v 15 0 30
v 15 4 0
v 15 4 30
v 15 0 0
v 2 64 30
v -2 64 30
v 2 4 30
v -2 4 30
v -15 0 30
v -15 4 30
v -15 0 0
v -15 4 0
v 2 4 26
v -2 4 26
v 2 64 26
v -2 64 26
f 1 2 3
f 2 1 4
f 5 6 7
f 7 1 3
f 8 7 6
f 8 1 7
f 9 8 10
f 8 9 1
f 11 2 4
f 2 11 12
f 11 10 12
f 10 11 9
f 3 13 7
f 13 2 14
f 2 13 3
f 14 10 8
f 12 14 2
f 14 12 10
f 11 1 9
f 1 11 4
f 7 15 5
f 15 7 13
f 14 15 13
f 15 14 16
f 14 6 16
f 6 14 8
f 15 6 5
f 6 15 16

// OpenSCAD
// Wall-mount bracket. Vertical plate fixes to a wall (modeled as the bed
// for printing); horizontal arm extends forward to support a tip load.
//
// Demonstrates: cantilever_stress (point load) + static_stability (COM
// outside support polygon when the arm is loaded). Also illustrates how
// `// load:` works with a real cross-section.
//
// part: bracket
// gravity: -z
// load: part=bracket force=30 axis=-z length_mm=60 section=rect:4x4 material=PLA

plate_w = 30;
plate_d = 4;
plate_h = 30;
arm_w  = 4;
arm_l  = 60;
arm_h  = 4;

module bracket() {
    // Vertical plate (the "wall" is the y=0 plane, here the bed).
    translate([-plate_w / 2, 0, 0])
        cube([plate_w, plate_d, plate_h]);
    // Horizontal arm extending in +y, attached at the top of the plate.
    translate([-arm_w / 2, plate_d, plate_h - arm_h])
        cube([arm_w, arm_l, arm_h]);
}

module assembly() {
    bracket();
}

assembly();
